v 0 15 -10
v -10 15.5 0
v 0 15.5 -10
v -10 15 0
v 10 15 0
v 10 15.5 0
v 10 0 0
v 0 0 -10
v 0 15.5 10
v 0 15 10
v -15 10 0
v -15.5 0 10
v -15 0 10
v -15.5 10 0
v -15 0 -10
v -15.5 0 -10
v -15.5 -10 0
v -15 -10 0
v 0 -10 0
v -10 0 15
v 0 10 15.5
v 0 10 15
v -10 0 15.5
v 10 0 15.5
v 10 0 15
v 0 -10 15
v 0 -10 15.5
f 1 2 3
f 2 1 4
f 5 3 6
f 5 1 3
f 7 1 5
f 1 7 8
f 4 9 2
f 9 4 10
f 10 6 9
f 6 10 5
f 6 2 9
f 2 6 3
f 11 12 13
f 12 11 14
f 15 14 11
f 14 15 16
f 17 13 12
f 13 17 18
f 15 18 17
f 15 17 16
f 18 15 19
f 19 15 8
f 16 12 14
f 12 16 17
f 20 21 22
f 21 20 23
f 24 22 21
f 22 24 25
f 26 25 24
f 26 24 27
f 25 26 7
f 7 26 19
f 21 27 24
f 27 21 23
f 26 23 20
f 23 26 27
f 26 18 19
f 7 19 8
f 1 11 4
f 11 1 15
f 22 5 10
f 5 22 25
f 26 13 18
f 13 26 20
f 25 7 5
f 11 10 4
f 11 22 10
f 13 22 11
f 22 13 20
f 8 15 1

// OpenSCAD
module dieShape(out) {
  rotate([-90,90,0]) cylinder(r=10,h=15+out, $fn=4);
  rotate([0,-90,0]) cylinder(r=10,h=15+out, $fn=4);
  rotate([0,0,0]) cylinder(r=10,h=15+out, $fn=4);
}
    
hull() dieShape(0);
dieShape(.5);
